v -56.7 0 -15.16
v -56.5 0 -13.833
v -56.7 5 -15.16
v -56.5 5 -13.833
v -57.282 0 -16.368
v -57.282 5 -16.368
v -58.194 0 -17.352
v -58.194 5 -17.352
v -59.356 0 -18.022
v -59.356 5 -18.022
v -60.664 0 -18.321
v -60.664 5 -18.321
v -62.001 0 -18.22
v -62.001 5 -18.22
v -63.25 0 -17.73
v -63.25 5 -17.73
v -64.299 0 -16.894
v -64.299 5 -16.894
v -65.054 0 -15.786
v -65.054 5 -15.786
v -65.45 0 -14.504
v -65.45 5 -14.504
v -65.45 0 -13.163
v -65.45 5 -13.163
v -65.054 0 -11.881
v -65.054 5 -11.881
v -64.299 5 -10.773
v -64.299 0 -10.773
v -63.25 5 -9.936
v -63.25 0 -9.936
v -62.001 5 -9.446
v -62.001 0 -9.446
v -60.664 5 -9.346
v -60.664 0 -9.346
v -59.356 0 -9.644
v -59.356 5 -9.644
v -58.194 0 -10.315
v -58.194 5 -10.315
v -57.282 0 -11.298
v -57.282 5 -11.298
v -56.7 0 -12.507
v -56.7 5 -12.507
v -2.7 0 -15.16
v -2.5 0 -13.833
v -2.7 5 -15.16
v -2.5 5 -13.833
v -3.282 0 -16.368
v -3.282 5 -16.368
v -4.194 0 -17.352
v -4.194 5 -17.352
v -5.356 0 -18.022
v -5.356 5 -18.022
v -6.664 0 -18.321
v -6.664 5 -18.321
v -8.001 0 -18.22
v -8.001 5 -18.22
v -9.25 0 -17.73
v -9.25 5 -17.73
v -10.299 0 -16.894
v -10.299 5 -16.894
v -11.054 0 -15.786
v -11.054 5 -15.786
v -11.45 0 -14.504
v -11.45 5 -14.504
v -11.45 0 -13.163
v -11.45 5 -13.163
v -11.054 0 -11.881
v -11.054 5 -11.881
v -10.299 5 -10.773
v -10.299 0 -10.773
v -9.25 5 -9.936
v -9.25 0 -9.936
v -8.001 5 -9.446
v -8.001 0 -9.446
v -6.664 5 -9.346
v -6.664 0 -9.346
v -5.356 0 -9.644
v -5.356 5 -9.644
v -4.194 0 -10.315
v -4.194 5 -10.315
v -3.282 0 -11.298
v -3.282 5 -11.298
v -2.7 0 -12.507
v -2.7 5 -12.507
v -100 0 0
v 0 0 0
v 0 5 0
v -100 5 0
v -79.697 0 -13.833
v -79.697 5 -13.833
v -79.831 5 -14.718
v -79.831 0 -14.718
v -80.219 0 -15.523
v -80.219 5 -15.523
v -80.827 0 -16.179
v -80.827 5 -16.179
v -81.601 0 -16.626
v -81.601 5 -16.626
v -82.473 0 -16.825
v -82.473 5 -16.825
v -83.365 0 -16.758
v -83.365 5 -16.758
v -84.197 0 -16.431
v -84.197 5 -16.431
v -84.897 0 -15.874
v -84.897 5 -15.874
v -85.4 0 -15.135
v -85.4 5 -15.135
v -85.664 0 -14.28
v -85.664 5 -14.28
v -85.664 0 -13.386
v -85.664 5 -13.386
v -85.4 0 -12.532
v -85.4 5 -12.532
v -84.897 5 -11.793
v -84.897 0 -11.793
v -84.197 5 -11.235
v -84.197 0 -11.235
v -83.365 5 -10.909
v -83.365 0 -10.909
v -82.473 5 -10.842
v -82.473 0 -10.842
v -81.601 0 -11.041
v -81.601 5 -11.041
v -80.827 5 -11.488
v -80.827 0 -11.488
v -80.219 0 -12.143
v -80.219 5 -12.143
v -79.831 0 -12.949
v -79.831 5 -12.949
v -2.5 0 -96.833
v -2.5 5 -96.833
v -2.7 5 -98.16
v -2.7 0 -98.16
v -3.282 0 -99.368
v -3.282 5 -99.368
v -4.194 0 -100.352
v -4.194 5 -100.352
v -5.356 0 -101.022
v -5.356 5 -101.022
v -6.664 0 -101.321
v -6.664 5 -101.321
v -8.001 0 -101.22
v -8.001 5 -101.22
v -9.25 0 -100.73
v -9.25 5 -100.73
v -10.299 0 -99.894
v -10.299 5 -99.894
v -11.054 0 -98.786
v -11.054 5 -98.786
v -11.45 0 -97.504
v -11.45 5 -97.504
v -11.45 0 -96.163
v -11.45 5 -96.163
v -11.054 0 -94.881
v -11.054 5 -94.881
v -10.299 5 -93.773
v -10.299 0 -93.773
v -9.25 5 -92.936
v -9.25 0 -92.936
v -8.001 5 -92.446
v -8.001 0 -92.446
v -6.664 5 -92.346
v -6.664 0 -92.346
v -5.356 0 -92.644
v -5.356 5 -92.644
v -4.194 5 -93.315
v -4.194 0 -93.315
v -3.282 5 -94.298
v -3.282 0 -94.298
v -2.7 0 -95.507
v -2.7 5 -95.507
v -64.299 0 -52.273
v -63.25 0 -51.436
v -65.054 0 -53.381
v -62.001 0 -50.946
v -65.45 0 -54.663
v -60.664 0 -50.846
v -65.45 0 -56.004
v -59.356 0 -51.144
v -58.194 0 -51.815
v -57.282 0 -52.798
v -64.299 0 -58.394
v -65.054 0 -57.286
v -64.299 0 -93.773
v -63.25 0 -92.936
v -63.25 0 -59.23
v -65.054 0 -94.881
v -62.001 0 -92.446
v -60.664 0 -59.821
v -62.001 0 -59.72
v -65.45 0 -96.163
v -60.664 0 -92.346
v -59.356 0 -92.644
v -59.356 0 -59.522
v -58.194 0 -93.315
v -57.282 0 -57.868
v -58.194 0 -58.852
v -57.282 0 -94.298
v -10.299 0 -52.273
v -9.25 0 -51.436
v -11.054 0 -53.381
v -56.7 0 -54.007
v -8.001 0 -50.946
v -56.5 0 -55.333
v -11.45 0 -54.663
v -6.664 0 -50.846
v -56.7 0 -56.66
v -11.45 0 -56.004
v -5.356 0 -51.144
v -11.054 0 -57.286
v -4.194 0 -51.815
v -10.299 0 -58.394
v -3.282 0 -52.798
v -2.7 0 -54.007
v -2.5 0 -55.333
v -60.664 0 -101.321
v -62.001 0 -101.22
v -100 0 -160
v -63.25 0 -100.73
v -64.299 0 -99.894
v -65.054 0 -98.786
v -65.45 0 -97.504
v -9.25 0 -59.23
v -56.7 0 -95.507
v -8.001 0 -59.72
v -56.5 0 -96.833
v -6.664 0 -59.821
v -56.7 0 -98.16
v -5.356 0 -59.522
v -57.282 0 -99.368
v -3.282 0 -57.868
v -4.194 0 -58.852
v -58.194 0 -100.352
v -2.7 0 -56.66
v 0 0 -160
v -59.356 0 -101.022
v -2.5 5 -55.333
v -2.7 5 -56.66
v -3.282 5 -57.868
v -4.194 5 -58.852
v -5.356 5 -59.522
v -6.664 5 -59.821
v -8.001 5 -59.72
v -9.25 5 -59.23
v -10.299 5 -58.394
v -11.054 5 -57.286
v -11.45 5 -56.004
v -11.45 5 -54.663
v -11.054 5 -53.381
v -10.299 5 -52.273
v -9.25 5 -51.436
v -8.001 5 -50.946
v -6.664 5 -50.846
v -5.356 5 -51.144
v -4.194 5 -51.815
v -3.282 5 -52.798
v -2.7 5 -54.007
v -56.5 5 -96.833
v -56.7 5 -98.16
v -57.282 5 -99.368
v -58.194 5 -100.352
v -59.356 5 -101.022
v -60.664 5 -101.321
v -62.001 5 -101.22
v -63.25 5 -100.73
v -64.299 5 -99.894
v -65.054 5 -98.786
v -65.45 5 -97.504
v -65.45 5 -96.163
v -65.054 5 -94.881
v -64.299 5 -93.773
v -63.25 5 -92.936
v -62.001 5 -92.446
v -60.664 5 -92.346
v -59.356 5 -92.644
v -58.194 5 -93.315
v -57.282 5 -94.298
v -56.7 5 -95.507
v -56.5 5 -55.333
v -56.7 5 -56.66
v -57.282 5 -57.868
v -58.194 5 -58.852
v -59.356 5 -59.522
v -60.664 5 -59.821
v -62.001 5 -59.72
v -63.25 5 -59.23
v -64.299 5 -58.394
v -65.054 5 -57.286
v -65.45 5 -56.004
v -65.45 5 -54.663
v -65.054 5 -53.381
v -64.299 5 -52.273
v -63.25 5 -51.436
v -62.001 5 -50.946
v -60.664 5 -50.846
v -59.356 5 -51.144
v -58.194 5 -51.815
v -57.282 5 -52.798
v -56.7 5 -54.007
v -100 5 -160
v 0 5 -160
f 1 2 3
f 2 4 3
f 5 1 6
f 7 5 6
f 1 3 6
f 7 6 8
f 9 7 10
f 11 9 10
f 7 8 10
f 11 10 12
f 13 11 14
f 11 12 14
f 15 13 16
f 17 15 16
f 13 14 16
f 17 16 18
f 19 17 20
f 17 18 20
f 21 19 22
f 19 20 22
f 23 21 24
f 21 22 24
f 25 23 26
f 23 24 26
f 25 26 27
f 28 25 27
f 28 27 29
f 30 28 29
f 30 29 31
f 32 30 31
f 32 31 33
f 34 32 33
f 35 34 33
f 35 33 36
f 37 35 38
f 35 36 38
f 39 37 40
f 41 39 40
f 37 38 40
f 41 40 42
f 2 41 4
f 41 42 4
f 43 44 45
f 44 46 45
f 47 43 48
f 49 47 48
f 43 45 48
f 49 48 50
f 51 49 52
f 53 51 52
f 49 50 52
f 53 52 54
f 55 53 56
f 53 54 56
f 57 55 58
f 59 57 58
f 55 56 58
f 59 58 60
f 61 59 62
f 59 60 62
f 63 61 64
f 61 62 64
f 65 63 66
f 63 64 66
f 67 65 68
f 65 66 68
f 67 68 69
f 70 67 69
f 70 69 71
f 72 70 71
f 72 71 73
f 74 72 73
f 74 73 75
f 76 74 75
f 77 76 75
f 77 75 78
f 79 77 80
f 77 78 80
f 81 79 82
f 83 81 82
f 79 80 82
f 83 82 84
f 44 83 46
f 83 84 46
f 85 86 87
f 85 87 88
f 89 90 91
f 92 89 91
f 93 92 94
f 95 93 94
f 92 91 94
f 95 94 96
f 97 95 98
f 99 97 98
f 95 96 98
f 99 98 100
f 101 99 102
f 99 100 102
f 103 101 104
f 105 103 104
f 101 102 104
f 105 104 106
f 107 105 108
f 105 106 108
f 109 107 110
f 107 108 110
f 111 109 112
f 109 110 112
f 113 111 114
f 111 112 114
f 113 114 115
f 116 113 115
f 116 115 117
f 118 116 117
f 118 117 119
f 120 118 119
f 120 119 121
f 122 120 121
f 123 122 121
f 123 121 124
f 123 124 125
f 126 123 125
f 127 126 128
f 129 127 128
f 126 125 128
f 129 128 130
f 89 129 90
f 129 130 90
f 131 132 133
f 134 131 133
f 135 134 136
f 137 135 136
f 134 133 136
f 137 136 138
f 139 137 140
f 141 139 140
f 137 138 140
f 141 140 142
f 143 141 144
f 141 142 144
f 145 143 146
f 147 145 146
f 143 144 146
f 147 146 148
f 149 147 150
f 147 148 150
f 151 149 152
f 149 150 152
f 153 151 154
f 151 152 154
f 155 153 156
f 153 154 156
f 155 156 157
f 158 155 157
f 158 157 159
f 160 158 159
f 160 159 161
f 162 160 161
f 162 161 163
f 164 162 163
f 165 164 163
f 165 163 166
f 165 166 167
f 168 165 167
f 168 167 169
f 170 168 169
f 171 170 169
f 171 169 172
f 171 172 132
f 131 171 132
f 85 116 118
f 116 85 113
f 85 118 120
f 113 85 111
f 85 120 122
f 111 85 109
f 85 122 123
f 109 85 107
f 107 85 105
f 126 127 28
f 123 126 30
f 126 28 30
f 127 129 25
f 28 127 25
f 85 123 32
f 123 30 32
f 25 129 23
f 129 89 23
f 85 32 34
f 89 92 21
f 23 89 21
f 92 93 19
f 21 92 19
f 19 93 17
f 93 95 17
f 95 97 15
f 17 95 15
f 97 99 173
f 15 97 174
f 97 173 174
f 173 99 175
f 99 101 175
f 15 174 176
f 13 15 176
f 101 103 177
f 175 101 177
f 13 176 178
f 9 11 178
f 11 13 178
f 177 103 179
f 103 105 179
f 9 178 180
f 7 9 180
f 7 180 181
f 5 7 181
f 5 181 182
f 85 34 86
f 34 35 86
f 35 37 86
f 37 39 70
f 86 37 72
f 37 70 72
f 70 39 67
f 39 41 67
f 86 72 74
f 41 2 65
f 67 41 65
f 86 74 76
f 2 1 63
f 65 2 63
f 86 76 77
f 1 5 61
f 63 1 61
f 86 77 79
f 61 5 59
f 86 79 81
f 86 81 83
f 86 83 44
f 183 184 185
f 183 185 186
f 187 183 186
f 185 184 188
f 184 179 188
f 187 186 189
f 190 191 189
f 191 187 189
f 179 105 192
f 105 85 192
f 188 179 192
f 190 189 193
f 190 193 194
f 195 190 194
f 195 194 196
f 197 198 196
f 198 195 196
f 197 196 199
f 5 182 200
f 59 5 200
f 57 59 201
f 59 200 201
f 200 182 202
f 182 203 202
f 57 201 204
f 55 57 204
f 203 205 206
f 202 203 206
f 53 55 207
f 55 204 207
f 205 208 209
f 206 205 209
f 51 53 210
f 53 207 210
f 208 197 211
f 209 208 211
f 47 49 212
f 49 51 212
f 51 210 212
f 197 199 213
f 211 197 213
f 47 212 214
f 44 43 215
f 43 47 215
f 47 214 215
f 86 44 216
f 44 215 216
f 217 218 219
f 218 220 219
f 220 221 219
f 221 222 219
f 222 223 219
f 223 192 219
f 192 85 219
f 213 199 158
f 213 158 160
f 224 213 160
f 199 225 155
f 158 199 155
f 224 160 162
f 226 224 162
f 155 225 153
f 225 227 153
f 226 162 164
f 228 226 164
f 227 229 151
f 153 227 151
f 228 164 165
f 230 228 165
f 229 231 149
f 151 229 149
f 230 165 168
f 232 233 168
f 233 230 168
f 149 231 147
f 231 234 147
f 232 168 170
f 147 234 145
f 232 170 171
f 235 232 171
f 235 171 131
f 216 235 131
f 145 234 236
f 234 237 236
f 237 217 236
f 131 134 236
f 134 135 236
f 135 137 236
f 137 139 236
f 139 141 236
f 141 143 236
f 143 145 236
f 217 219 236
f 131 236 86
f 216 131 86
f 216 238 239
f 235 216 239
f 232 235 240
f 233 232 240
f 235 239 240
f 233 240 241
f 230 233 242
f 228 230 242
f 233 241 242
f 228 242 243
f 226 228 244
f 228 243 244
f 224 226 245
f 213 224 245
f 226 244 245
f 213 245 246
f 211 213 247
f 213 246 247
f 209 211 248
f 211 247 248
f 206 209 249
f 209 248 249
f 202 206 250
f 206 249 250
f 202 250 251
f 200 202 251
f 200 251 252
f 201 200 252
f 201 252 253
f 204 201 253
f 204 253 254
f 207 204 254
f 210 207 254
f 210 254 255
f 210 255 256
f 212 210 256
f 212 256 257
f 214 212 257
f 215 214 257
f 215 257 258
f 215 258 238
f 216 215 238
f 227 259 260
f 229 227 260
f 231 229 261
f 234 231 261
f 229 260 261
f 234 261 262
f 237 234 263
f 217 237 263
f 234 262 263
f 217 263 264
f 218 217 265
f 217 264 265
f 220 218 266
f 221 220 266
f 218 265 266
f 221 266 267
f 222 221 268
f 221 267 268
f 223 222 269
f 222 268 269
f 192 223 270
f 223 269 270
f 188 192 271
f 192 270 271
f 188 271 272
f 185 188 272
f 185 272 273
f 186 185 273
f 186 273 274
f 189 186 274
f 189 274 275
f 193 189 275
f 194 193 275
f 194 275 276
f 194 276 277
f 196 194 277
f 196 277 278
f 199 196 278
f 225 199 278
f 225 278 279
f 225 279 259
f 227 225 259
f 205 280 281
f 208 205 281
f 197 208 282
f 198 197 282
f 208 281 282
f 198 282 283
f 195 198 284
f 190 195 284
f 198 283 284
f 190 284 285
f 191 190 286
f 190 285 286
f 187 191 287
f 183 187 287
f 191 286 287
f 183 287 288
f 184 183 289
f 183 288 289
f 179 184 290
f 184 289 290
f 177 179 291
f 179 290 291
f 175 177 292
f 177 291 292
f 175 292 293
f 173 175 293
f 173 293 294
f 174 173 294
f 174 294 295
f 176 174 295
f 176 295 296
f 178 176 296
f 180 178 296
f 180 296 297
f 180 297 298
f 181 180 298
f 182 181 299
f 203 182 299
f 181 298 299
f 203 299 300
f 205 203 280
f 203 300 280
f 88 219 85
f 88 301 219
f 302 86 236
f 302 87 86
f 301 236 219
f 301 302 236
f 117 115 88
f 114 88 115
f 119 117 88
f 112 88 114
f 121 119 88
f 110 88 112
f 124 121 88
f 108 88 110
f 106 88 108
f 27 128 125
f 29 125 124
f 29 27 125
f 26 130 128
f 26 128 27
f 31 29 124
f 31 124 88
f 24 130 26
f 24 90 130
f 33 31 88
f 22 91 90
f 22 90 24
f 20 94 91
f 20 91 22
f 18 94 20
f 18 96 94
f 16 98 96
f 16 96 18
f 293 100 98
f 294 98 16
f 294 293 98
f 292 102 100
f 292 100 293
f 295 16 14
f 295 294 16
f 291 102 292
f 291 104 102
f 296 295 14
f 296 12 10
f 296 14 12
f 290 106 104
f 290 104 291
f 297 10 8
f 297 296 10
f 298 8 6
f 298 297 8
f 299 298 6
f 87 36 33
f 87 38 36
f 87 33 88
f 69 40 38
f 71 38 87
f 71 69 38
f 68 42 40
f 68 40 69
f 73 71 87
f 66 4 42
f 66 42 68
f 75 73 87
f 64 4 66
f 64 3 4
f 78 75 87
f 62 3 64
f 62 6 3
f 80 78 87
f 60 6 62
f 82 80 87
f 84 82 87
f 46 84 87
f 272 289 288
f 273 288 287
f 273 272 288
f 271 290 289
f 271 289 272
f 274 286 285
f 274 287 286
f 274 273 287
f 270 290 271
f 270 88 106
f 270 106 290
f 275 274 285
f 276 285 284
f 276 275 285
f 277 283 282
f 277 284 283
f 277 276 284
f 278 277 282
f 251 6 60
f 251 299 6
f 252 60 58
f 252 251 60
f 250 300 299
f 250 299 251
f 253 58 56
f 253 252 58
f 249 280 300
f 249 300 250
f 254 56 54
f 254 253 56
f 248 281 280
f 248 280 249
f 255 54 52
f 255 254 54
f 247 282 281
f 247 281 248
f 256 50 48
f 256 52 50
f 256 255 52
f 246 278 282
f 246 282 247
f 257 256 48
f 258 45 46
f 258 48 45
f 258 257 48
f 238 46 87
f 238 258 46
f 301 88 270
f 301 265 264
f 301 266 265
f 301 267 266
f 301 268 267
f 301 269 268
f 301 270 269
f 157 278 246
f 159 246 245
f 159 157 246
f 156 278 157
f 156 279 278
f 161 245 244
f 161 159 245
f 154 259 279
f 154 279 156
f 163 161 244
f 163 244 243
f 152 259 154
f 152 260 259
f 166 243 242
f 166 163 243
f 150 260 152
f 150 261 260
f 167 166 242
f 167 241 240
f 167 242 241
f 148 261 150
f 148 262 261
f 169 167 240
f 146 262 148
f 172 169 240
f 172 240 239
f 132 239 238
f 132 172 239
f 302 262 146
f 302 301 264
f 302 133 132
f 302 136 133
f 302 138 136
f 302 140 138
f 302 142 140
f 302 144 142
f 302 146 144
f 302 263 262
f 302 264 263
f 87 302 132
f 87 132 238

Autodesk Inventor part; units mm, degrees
ref_plane "YZ Plane" through (0, 0, 0) normal (1, 0, 0) x (0, 1, 0)
ref_plane "XZ Plane" through (0, 0, 0) normal (0, 1, 0) x (-1, 0, 0)
ref_plane "XY Plane" through (0, 0, 0) normal (0, 0, 1) x (1, 0, 0)
sketch "Sketch1" plane through (0, 0, 0) normal (0, 1, 0) x (-1, 0, 0)
  line L0 (0, 0) -> (100, 0)
  line L1 (100, 0) -> (100, -110)
  line L2 (100, -110) -> (0, -110)
  line L3 (0, -110) -> (0, 0)
  dimension "d0" = 100
  dimension "d1" = 110
extrude "Extrusion1" add sketch "Sketch1" along normal blind 5
sketch "Sketch2" plane through (0, 5, 0) normal (0, 1, 0) x (1, 0, 0)
  circle A0 centre (-7, 13.8333) radius 4.5
  line L0 (0, 0) -> (0, 110) projected
  line L1 (-100, 0) -> (0, 0) projected
  circle A1 centre (-7, 55.3333) radius 4.5
  circle A2 centre (-7, 96.8333) radius 4.5
  line L2 (-34, 0) -> (-34, 110)
  circle A3 centre (-61, 13.8333) radius 4.5
  circle A4 centre (-61, 55.3333) radius 4.5
  circle A5 centre (-61, 96.8333) radius 4.5
  circle A6 centre (-82.6974, 13.8333) radius 3
  dimension "d4" = 9
  dimension "d5" = 7
  dimension "d6" = 110
  dimension "d7" = 13.8333
  dimension "d10" = 41.5
  dimension "d19" = 27
  dimension "d20" = 6
extrude "Extrusion2" cut sketch "Sketch2" against normal blind 10
sketch "Sketch3" plane through (0, 5, 0) normal (0, 1, 0) x (1, 0, 0)
  line L0 (-100, 110) -> (0, 110) projected
  line L1 (-100, 110) -> (0, 110)
  line L2 (0, 110) -> (0, 160)
  line L3 (0, 160) -> (-100, 160)
  line L4 (-100, 160) -> (-100, 110)
  point P0 (0, 0)
  dimension "d21" = 50
extrude "Extrusion3" add sketch "Sketch3" against normal blind 5
equation "\"d7\" = -0.5 * d4 + 0.166667 * d6"
equation "\"d10\" = -1.5 * d4 + 0.5 * d6"
properties part number "HeaderWheelSupport"
